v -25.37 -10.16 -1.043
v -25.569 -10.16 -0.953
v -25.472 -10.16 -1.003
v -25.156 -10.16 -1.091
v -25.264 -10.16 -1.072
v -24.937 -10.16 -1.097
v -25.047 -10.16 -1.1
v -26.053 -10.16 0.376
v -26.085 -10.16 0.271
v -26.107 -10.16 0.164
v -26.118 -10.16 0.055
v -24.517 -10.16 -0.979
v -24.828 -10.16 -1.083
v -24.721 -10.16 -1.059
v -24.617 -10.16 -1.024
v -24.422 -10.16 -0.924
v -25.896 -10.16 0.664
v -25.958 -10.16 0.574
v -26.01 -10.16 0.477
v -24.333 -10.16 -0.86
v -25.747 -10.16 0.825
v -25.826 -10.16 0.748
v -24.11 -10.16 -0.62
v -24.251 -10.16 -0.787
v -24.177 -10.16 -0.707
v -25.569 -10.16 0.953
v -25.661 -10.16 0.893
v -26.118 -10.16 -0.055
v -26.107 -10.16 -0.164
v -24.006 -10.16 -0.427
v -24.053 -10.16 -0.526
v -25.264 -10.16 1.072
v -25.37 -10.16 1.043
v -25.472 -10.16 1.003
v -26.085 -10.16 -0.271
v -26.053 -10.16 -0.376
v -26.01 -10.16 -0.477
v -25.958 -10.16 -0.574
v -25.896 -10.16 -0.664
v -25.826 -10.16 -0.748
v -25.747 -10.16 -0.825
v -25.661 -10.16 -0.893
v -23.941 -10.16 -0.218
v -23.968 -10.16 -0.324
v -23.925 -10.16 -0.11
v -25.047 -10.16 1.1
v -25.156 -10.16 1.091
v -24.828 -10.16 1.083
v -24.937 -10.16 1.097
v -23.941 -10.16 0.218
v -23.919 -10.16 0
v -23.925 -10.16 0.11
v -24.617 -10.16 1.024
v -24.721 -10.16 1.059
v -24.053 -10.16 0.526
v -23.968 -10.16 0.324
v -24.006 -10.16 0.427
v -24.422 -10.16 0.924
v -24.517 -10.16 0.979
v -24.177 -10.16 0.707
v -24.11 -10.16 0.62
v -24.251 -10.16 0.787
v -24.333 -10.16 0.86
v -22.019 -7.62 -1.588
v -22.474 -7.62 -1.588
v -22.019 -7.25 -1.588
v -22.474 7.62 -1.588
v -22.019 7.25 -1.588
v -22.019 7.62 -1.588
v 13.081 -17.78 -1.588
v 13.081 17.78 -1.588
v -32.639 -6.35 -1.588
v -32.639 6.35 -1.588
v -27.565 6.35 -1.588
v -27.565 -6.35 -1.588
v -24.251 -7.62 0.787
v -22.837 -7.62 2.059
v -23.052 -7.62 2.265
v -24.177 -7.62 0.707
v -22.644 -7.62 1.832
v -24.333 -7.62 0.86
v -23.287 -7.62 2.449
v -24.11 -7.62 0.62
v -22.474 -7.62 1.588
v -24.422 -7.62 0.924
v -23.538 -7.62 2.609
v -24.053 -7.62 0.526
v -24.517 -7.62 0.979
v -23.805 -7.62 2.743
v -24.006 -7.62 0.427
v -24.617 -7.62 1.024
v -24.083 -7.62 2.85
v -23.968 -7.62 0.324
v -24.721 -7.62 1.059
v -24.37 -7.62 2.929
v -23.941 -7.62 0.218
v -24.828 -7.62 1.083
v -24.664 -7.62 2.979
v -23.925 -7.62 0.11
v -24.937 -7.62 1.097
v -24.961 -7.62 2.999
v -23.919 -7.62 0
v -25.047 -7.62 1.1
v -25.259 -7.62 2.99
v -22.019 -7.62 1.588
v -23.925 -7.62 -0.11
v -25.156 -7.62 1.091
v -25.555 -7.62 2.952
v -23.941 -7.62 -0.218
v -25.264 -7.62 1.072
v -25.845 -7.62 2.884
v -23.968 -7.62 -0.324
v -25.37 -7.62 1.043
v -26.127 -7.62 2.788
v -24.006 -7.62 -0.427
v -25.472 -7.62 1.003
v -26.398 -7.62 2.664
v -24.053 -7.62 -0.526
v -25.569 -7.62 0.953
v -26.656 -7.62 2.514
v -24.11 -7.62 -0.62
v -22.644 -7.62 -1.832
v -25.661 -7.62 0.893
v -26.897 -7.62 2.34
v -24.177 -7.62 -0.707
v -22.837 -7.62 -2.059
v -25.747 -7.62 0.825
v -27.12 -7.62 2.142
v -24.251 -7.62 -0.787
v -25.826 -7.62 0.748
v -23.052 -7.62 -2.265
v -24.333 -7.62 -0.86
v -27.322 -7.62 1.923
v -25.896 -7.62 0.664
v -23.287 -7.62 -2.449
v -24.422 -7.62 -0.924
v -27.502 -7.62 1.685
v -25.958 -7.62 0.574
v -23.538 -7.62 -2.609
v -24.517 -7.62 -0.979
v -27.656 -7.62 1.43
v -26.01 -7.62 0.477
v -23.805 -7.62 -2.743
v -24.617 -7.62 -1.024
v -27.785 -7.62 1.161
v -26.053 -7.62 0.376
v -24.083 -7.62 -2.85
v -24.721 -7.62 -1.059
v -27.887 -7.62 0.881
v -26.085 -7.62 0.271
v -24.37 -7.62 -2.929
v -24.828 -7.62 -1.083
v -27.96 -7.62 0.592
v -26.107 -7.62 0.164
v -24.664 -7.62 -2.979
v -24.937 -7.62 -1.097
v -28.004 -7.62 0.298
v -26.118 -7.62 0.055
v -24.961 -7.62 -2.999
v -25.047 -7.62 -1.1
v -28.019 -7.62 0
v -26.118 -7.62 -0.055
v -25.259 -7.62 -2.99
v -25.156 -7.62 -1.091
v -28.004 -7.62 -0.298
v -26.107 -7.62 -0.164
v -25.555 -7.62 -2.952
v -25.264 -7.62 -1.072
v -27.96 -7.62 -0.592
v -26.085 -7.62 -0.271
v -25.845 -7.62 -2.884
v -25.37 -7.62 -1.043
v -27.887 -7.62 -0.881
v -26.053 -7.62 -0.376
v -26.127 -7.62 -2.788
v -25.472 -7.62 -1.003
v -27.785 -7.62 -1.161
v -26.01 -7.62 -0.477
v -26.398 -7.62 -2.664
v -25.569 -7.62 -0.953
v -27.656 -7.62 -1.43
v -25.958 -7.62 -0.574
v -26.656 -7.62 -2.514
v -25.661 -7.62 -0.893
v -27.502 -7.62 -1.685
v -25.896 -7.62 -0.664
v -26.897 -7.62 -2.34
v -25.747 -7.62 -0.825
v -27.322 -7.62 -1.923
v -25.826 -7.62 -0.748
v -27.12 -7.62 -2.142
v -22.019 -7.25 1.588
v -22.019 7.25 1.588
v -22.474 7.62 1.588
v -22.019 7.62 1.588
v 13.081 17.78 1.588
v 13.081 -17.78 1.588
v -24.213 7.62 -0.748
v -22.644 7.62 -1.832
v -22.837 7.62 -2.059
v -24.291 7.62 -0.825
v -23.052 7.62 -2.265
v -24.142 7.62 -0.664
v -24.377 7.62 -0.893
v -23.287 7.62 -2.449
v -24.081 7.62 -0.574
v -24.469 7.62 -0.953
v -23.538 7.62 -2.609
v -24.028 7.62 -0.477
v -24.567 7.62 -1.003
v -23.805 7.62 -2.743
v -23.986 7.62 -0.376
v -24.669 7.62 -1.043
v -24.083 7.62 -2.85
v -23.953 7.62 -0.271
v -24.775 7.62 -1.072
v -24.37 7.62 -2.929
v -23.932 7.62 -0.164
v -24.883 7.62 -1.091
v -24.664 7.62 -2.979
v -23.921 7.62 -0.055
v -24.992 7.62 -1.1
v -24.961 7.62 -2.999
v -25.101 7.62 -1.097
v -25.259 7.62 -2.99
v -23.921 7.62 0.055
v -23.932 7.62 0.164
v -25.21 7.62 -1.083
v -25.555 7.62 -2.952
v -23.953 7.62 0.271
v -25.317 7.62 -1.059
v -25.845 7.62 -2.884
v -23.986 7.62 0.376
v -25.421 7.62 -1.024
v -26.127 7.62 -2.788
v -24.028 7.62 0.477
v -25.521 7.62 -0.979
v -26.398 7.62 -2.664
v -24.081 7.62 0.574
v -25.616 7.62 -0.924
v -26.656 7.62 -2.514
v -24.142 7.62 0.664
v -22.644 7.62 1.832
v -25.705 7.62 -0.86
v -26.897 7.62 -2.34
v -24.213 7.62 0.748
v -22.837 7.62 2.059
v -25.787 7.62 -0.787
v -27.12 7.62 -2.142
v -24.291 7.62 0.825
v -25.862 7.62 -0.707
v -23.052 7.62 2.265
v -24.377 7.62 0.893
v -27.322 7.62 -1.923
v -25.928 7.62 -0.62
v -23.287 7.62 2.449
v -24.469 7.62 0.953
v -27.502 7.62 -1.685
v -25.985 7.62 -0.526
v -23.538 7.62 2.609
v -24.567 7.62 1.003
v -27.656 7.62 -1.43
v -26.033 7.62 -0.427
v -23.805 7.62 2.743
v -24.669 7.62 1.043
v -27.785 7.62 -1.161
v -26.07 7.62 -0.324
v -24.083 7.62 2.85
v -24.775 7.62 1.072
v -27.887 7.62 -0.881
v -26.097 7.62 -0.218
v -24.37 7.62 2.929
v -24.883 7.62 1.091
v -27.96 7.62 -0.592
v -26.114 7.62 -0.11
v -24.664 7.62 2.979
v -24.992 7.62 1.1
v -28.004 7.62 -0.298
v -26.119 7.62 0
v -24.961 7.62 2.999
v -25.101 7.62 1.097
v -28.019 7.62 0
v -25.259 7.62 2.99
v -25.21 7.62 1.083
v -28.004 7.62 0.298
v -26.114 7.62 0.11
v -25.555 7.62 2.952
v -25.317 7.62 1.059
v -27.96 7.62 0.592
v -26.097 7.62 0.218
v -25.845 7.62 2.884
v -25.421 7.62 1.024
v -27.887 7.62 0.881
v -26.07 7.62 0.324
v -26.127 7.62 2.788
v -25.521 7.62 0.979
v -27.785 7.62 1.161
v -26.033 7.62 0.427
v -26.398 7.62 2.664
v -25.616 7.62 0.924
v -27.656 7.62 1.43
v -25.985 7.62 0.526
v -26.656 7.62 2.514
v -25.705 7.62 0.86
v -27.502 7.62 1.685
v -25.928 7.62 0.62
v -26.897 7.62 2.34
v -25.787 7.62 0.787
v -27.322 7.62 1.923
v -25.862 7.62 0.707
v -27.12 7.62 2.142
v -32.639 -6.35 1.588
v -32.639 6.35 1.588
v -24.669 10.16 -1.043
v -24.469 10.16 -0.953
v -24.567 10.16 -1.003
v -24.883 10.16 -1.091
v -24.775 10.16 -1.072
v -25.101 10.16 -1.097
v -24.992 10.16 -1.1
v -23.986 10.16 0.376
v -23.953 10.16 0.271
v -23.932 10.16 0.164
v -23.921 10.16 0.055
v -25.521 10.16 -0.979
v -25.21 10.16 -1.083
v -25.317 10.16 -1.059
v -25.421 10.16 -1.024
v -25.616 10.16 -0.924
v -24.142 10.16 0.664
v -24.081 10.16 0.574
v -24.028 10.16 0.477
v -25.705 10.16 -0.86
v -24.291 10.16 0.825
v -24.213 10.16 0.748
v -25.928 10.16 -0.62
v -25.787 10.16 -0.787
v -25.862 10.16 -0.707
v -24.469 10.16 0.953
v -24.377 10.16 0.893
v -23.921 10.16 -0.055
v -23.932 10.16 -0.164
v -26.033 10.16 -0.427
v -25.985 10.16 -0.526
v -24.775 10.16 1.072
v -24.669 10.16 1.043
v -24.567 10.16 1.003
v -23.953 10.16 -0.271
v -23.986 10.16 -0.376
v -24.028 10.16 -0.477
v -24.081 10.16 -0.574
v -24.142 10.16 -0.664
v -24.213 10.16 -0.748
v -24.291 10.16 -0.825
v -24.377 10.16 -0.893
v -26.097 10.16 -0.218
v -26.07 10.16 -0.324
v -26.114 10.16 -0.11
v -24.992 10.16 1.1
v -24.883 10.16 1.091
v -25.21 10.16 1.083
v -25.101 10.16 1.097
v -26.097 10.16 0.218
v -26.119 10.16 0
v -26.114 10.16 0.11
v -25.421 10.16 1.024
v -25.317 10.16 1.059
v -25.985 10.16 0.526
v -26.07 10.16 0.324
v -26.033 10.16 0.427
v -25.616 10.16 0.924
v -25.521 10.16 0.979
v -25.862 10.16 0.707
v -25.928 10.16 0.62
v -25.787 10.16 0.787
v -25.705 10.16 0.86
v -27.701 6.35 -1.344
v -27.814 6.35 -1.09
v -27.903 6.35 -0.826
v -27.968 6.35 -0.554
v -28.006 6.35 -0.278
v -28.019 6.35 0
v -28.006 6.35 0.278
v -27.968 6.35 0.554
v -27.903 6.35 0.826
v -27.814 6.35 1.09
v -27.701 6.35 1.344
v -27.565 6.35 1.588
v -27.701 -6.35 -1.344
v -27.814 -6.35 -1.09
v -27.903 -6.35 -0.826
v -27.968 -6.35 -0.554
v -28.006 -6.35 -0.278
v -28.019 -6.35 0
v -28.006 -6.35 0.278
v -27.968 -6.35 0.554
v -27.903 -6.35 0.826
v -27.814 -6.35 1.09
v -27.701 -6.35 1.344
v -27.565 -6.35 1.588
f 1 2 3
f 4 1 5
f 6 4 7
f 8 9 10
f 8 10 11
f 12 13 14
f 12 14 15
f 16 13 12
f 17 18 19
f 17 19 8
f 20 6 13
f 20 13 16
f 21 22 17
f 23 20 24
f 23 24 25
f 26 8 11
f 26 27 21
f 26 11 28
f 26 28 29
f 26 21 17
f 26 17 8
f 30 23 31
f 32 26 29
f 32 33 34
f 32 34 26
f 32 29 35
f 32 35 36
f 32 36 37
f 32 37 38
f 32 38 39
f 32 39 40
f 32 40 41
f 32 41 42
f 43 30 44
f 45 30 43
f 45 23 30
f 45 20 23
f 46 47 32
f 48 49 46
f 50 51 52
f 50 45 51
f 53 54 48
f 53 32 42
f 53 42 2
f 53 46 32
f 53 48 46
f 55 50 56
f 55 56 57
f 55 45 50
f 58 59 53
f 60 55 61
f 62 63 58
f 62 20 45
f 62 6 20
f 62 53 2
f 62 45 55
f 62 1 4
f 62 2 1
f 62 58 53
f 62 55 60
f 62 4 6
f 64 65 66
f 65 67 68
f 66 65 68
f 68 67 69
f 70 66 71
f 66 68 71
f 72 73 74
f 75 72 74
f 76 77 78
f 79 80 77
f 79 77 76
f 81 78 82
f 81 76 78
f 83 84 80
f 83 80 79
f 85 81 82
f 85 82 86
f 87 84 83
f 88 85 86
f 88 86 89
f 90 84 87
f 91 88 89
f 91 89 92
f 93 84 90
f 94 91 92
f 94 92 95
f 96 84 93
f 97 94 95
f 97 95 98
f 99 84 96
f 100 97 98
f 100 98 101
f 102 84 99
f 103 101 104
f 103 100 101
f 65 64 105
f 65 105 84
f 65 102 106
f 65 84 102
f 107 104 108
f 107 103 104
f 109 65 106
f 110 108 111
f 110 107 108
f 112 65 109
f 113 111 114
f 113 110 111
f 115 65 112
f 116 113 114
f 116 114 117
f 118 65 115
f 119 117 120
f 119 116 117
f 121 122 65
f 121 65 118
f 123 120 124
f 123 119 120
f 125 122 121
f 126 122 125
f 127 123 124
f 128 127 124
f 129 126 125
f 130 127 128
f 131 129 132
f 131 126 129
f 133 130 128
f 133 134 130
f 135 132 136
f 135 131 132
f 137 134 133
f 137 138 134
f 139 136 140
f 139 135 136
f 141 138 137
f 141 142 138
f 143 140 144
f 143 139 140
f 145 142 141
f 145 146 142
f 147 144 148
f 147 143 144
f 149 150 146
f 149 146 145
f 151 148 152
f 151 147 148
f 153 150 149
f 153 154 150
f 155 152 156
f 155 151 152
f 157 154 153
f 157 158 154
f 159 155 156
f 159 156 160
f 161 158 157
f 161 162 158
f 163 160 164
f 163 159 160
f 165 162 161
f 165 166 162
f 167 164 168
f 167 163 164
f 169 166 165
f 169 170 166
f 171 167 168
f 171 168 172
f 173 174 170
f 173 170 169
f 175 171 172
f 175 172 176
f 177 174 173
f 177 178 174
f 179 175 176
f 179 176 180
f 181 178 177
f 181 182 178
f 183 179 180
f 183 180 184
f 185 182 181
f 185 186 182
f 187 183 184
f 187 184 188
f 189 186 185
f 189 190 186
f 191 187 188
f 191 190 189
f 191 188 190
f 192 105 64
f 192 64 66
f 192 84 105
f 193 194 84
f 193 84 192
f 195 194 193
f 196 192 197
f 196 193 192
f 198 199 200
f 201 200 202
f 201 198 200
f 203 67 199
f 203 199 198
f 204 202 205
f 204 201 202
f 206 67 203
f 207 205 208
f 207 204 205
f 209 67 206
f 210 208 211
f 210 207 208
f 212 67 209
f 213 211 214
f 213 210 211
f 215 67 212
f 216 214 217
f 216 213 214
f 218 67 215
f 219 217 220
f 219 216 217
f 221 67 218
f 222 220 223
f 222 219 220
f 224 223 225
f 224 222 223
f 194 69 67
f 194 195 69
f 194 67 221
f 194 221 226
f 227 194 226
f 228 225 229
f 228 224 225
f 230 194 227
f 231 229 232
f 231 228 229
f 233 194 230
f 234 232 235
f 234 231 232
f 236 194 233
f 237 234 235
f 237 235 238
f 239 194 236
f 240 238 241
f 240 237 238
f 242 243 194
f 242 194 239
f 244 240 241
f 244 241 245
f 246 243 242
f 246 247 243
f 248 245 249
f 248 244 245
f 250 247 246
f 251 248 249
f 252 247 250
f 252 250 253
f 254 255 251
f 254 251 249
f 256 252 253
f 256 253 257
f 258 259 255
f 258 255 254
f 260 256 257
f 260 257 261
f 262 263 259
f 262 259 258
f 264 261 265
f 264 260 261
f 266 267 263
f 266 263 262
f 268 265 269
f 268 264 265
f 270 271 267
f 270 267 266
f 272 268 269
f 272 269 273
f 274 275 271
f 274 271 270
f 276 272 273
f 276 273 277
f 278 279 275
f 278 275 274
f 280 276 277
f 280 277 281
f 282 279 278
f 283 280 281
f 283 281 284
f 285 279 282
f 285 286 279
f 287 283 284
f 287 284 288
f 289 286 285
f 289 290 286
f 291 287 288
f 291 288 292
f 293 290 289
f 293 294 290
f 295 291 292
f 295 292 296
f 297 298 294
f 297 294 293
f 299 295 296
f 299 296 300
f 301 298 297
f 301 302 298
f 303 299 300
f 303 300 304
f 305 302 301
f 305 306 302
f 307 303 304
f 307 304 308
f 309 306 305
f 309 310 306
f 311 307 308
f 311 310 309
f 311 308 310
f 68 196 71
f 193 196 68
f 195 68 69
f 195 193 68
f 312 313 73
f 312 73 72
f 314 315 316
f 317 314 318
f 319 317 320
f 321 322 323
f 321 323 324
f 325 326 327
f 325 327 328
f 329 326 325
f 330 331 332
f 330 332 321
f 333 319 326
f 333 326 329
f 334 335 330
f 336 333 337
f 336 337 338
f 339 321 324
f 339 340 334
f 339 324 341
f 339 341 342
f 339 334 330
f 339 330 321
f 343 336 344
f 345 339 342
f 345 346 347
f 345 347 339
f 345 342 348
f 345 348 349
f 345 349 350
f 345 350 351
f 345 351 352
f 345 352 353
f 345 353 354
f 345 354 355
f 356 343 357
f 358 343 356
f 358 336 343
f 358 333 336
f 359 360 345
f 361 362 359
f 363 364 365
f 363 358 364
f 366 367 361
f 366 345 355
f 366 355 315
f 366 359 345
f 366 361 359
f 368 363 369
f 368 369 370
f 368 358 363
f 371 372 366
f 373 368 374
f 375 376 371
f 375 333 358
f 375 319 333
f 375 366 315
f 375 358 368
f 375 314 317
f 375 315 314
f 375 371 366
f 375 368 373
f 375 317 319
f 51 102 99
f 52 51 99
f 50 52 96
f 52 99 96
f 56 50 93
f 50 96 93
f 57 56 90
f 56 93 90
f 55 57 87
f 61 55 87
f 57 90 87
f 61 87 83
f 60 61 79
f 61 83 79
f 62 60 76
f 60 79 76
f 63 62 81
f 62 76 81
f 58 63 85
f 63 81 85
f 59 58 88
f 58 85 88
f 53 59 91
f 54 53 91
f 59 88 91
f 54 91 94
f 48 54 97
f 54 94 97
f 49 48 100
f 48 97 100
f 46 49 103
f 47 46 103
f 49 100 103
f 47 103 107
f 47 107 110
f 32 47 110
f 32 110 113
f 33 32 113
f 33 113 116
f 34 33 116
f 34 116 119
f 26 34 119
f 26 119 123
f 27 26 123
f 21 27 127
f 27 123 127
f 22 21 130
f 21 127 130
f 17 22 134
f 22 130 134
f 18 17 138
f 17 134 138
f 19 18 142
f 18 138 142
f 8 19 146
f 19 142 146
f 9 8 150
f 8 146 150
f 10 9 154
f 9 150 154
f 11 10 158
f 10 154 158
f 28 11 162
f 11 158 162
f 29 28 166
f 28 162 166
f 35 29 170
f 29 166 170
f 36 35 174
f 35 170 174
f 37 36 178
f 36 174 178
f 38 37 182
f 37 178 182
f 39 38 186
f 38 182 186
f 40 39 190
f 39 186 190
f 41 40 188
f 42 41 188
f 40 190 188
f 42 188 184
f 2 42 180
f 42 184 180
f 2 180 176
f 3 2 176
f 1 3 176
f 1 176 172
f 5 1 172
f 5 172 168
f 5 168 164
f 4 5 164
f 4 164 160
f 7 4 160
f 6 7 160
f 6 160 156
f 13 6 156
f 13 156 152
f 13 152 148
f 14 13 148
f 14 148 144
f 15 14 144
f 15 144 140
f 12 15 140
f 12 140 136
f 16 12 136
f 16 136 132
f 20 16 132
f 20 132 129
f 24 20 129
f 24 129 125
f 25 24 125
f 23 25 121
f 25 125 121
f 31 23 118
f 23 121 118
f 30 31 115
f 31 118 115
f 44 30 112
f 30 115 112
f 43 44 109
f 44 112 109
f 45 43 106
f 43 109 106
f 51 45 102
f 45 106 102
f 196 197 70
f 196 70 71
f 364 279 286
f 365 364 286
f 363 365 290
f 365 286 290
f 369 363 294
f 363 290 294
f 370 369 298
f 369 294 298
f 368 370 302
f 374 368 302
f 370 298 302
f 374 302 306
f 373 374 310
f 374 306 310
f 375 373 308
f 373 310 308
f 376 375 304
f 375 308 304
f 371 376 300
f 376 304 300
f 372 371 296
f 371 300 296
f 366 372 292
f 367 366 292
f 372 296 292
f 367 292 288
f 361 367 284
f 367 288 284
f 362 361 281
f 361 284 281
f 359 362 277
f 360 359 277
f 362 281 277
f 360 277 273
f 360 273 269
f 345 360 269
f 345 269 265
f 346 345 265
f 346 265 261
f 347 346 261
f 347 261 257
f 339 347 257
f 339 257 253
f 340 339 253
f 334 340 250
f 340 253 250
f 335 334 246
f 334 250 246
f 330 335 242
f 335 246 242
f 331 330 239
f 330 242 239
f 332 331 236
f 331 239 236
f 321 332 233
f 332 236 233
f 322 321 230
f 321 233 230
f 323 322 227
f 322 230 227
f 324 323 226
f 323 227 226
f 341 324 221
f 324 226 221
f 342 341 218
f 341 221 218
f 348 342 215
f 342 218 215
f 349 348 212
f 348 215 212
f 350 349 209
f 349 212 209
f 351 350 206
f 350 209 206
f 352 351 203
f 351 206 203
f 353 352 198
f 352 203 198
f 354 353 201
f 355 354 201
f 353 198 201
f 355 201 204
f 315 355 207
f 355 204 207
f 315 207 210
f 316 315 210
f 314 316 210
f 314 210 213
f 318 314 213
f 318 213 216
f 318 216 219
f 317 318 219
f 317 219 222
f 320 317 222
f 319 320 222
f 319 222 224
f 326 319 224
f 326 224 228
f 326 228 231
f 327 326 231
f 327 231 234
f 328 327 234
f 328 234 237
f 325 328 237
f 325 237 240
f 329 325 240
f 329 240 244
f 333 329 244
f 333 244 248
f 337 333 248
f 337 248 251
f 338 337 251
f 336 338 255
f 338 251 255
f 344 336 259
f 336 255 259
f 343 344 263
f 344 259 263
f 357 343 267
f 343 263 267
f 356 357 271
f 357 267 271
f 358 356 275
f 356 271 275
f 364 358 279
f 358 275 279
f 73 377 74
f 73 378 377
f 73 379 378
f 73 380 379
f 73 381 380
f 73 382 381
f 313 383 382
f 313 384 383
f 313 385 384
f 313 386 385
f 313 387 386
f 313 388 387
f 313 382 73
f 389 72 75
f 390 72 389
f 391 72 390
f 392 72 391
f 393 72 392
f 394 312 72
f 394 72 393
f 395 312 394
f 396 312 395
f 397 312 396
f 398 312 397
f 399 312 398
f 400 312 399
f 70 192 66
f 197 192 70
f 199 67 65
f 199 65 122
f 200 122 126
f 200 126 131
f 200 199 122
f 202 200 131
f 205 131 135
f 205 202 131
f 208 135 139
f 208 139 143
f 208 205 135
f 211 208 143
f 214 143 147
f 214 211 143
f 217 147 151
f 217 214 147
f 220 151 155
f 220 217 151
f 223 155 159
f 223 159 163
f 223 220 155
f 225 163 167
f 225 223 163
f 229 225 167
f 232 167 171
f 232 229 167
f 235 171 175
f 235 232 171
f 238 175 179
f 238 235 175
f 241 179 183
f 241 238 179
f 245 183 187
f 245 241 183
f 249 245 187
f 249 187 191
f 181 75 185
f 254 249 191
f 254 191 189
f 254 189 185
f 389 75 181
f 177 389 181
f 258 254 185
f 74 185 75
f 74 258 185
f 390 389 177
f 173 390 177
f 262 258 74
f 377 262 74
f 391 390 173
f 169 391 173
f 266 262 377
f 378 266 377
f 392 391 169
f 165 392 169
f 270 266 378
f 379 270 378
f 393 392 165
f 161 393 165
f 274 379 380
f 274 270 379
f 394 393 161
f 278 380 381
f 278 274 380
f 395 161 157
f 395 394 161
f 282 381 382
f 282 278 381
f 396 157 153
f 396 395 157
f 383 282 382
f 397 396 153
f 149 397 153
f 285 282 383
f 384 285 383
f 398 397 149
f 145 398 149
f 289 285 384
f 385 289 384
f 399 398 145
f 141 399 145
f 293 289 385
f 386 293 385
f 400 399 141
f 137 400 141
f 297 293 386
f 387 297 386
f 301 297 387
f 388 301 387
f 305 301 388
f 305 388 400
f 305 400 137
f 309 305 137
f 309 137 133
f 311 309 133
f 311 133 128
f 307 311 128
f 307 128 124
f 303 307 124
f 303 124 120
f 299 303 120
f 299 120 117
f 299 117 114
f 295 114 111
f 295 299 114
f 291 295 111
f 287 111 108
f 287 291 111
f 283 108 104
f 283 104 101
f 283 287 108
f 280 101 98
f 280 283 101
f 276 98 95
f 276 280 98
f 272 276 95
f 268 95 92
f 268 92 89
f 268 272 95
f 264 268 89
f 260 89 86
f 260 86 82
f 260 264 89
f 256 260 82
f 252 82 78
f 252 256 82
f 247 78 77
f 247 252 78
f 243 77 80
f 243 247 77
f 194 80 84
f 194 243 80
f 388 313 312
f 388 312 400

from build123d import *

# Parameters (mm, degrees)
F2_DEPTH = 1.5875
F4_R     = 1.1
F5_DEPTH = 2.54
F3_R     = 1.1
F6_DEPTH = 2.54


with BuildPart() as f1:
    # F0 (on Top) → F1 (revolve)
    with BuildSketch(Plane.XY):
        Polygon((-25.0192951104, 6.35), (-25.0192951104, 0), (-25.0192951104, -6.35), (-22.0192951104, -6.35), (-22.0192951104, 6.35), align=None)
        Polygon((-25.0192951104, 7.62), (-25.0192951104, 6.35), (-22.0192951104, 7.25), (-22.0192951104, 7.62), align=None)
        Polygon((-22.0192951104, -7.25), (-25.0192951104, -6.35), (-25.0192951104, -7.62), (-22.0192951104, -7.62), align=None)
        Polygon((-22.0192951104, -6.35), (-25.0192951104, -6.35), (-22.0192951104, -7.25), align=None)
        Polygon((-22.0192951104, 7.25), (-25.0192951104, 6.35), (-22.0192951104, 6.35), align=None)
    revolve(axis=Axis((-25.0192951104, 3.175, 0), (0, 1, 0)))

    # F0 (on Top) → F2 (join, symmetric)
    with BuildSketch(Plane.XY):
        Polygon((-25.0192951104, 6.35), (-25.0192951104, 0), (-25.0192951104, -6.35), (-22.0192951104, -6.35), (-22.0192951104, 6.35), align=None)
        Polygon((-25.0192951104, -6.35), (-25.0192951104, 0), (-25.0192951104, 6.35), (-32.6392951104, 6.35), (-32.6392951104, -6.35), align=None)
        Polygon((-22.0192951104, -6.35), (-25.0192951104, -6.35), (-22.0192951104, -7.25), align=None)
        Polygon((-22.0192951104, -7.25), (-25.0192951104, -6.35), (-25.0192951104, -7.62), (-22.0192951104, -7.62), align=None)
        Polygon((-25.0192951104, 7.62), (-25.0192951104, 6.35), (-22.0192951104, 7.25), (-22.0192951104, 7.62), align=None)
        Polygon((-22.0192951104, 7.25), (-25.0192951104, 6.35), (-22.0192951104, 6.35), align=None)
        Polygon((-22.0192951104, -6.35), (-22.0192951104, -7.25), (13.0807048896, -17.78), (13.0807048896, 0), (13.0807048896, 17.78), (-22.0192951104, 7.25), (-22.0192951104, 6.35), align=None)
    extrude(amount=F2_DEPTH, both=True)

    # F4 (on face) → F5 (join)
    with BuildSketch(Plane(origin=(0, 7.62, 0), x_dir=(-1, 0, 0), z_dir=(0, 1, 0))):
        with Locations((25.0192951104, 0)):
            Circle(F4_R)
    extrude(amount=F5_DEPTH)

    # F3 (on face) → F6 (join)
    with BuildSketch(Plane.XZ.offset(7.62)):
        with Locations((-25.0192951104, 0)):
            Circle(F3_R)
    extrude(amount=F6_DEPTH)


solid = f1.part
